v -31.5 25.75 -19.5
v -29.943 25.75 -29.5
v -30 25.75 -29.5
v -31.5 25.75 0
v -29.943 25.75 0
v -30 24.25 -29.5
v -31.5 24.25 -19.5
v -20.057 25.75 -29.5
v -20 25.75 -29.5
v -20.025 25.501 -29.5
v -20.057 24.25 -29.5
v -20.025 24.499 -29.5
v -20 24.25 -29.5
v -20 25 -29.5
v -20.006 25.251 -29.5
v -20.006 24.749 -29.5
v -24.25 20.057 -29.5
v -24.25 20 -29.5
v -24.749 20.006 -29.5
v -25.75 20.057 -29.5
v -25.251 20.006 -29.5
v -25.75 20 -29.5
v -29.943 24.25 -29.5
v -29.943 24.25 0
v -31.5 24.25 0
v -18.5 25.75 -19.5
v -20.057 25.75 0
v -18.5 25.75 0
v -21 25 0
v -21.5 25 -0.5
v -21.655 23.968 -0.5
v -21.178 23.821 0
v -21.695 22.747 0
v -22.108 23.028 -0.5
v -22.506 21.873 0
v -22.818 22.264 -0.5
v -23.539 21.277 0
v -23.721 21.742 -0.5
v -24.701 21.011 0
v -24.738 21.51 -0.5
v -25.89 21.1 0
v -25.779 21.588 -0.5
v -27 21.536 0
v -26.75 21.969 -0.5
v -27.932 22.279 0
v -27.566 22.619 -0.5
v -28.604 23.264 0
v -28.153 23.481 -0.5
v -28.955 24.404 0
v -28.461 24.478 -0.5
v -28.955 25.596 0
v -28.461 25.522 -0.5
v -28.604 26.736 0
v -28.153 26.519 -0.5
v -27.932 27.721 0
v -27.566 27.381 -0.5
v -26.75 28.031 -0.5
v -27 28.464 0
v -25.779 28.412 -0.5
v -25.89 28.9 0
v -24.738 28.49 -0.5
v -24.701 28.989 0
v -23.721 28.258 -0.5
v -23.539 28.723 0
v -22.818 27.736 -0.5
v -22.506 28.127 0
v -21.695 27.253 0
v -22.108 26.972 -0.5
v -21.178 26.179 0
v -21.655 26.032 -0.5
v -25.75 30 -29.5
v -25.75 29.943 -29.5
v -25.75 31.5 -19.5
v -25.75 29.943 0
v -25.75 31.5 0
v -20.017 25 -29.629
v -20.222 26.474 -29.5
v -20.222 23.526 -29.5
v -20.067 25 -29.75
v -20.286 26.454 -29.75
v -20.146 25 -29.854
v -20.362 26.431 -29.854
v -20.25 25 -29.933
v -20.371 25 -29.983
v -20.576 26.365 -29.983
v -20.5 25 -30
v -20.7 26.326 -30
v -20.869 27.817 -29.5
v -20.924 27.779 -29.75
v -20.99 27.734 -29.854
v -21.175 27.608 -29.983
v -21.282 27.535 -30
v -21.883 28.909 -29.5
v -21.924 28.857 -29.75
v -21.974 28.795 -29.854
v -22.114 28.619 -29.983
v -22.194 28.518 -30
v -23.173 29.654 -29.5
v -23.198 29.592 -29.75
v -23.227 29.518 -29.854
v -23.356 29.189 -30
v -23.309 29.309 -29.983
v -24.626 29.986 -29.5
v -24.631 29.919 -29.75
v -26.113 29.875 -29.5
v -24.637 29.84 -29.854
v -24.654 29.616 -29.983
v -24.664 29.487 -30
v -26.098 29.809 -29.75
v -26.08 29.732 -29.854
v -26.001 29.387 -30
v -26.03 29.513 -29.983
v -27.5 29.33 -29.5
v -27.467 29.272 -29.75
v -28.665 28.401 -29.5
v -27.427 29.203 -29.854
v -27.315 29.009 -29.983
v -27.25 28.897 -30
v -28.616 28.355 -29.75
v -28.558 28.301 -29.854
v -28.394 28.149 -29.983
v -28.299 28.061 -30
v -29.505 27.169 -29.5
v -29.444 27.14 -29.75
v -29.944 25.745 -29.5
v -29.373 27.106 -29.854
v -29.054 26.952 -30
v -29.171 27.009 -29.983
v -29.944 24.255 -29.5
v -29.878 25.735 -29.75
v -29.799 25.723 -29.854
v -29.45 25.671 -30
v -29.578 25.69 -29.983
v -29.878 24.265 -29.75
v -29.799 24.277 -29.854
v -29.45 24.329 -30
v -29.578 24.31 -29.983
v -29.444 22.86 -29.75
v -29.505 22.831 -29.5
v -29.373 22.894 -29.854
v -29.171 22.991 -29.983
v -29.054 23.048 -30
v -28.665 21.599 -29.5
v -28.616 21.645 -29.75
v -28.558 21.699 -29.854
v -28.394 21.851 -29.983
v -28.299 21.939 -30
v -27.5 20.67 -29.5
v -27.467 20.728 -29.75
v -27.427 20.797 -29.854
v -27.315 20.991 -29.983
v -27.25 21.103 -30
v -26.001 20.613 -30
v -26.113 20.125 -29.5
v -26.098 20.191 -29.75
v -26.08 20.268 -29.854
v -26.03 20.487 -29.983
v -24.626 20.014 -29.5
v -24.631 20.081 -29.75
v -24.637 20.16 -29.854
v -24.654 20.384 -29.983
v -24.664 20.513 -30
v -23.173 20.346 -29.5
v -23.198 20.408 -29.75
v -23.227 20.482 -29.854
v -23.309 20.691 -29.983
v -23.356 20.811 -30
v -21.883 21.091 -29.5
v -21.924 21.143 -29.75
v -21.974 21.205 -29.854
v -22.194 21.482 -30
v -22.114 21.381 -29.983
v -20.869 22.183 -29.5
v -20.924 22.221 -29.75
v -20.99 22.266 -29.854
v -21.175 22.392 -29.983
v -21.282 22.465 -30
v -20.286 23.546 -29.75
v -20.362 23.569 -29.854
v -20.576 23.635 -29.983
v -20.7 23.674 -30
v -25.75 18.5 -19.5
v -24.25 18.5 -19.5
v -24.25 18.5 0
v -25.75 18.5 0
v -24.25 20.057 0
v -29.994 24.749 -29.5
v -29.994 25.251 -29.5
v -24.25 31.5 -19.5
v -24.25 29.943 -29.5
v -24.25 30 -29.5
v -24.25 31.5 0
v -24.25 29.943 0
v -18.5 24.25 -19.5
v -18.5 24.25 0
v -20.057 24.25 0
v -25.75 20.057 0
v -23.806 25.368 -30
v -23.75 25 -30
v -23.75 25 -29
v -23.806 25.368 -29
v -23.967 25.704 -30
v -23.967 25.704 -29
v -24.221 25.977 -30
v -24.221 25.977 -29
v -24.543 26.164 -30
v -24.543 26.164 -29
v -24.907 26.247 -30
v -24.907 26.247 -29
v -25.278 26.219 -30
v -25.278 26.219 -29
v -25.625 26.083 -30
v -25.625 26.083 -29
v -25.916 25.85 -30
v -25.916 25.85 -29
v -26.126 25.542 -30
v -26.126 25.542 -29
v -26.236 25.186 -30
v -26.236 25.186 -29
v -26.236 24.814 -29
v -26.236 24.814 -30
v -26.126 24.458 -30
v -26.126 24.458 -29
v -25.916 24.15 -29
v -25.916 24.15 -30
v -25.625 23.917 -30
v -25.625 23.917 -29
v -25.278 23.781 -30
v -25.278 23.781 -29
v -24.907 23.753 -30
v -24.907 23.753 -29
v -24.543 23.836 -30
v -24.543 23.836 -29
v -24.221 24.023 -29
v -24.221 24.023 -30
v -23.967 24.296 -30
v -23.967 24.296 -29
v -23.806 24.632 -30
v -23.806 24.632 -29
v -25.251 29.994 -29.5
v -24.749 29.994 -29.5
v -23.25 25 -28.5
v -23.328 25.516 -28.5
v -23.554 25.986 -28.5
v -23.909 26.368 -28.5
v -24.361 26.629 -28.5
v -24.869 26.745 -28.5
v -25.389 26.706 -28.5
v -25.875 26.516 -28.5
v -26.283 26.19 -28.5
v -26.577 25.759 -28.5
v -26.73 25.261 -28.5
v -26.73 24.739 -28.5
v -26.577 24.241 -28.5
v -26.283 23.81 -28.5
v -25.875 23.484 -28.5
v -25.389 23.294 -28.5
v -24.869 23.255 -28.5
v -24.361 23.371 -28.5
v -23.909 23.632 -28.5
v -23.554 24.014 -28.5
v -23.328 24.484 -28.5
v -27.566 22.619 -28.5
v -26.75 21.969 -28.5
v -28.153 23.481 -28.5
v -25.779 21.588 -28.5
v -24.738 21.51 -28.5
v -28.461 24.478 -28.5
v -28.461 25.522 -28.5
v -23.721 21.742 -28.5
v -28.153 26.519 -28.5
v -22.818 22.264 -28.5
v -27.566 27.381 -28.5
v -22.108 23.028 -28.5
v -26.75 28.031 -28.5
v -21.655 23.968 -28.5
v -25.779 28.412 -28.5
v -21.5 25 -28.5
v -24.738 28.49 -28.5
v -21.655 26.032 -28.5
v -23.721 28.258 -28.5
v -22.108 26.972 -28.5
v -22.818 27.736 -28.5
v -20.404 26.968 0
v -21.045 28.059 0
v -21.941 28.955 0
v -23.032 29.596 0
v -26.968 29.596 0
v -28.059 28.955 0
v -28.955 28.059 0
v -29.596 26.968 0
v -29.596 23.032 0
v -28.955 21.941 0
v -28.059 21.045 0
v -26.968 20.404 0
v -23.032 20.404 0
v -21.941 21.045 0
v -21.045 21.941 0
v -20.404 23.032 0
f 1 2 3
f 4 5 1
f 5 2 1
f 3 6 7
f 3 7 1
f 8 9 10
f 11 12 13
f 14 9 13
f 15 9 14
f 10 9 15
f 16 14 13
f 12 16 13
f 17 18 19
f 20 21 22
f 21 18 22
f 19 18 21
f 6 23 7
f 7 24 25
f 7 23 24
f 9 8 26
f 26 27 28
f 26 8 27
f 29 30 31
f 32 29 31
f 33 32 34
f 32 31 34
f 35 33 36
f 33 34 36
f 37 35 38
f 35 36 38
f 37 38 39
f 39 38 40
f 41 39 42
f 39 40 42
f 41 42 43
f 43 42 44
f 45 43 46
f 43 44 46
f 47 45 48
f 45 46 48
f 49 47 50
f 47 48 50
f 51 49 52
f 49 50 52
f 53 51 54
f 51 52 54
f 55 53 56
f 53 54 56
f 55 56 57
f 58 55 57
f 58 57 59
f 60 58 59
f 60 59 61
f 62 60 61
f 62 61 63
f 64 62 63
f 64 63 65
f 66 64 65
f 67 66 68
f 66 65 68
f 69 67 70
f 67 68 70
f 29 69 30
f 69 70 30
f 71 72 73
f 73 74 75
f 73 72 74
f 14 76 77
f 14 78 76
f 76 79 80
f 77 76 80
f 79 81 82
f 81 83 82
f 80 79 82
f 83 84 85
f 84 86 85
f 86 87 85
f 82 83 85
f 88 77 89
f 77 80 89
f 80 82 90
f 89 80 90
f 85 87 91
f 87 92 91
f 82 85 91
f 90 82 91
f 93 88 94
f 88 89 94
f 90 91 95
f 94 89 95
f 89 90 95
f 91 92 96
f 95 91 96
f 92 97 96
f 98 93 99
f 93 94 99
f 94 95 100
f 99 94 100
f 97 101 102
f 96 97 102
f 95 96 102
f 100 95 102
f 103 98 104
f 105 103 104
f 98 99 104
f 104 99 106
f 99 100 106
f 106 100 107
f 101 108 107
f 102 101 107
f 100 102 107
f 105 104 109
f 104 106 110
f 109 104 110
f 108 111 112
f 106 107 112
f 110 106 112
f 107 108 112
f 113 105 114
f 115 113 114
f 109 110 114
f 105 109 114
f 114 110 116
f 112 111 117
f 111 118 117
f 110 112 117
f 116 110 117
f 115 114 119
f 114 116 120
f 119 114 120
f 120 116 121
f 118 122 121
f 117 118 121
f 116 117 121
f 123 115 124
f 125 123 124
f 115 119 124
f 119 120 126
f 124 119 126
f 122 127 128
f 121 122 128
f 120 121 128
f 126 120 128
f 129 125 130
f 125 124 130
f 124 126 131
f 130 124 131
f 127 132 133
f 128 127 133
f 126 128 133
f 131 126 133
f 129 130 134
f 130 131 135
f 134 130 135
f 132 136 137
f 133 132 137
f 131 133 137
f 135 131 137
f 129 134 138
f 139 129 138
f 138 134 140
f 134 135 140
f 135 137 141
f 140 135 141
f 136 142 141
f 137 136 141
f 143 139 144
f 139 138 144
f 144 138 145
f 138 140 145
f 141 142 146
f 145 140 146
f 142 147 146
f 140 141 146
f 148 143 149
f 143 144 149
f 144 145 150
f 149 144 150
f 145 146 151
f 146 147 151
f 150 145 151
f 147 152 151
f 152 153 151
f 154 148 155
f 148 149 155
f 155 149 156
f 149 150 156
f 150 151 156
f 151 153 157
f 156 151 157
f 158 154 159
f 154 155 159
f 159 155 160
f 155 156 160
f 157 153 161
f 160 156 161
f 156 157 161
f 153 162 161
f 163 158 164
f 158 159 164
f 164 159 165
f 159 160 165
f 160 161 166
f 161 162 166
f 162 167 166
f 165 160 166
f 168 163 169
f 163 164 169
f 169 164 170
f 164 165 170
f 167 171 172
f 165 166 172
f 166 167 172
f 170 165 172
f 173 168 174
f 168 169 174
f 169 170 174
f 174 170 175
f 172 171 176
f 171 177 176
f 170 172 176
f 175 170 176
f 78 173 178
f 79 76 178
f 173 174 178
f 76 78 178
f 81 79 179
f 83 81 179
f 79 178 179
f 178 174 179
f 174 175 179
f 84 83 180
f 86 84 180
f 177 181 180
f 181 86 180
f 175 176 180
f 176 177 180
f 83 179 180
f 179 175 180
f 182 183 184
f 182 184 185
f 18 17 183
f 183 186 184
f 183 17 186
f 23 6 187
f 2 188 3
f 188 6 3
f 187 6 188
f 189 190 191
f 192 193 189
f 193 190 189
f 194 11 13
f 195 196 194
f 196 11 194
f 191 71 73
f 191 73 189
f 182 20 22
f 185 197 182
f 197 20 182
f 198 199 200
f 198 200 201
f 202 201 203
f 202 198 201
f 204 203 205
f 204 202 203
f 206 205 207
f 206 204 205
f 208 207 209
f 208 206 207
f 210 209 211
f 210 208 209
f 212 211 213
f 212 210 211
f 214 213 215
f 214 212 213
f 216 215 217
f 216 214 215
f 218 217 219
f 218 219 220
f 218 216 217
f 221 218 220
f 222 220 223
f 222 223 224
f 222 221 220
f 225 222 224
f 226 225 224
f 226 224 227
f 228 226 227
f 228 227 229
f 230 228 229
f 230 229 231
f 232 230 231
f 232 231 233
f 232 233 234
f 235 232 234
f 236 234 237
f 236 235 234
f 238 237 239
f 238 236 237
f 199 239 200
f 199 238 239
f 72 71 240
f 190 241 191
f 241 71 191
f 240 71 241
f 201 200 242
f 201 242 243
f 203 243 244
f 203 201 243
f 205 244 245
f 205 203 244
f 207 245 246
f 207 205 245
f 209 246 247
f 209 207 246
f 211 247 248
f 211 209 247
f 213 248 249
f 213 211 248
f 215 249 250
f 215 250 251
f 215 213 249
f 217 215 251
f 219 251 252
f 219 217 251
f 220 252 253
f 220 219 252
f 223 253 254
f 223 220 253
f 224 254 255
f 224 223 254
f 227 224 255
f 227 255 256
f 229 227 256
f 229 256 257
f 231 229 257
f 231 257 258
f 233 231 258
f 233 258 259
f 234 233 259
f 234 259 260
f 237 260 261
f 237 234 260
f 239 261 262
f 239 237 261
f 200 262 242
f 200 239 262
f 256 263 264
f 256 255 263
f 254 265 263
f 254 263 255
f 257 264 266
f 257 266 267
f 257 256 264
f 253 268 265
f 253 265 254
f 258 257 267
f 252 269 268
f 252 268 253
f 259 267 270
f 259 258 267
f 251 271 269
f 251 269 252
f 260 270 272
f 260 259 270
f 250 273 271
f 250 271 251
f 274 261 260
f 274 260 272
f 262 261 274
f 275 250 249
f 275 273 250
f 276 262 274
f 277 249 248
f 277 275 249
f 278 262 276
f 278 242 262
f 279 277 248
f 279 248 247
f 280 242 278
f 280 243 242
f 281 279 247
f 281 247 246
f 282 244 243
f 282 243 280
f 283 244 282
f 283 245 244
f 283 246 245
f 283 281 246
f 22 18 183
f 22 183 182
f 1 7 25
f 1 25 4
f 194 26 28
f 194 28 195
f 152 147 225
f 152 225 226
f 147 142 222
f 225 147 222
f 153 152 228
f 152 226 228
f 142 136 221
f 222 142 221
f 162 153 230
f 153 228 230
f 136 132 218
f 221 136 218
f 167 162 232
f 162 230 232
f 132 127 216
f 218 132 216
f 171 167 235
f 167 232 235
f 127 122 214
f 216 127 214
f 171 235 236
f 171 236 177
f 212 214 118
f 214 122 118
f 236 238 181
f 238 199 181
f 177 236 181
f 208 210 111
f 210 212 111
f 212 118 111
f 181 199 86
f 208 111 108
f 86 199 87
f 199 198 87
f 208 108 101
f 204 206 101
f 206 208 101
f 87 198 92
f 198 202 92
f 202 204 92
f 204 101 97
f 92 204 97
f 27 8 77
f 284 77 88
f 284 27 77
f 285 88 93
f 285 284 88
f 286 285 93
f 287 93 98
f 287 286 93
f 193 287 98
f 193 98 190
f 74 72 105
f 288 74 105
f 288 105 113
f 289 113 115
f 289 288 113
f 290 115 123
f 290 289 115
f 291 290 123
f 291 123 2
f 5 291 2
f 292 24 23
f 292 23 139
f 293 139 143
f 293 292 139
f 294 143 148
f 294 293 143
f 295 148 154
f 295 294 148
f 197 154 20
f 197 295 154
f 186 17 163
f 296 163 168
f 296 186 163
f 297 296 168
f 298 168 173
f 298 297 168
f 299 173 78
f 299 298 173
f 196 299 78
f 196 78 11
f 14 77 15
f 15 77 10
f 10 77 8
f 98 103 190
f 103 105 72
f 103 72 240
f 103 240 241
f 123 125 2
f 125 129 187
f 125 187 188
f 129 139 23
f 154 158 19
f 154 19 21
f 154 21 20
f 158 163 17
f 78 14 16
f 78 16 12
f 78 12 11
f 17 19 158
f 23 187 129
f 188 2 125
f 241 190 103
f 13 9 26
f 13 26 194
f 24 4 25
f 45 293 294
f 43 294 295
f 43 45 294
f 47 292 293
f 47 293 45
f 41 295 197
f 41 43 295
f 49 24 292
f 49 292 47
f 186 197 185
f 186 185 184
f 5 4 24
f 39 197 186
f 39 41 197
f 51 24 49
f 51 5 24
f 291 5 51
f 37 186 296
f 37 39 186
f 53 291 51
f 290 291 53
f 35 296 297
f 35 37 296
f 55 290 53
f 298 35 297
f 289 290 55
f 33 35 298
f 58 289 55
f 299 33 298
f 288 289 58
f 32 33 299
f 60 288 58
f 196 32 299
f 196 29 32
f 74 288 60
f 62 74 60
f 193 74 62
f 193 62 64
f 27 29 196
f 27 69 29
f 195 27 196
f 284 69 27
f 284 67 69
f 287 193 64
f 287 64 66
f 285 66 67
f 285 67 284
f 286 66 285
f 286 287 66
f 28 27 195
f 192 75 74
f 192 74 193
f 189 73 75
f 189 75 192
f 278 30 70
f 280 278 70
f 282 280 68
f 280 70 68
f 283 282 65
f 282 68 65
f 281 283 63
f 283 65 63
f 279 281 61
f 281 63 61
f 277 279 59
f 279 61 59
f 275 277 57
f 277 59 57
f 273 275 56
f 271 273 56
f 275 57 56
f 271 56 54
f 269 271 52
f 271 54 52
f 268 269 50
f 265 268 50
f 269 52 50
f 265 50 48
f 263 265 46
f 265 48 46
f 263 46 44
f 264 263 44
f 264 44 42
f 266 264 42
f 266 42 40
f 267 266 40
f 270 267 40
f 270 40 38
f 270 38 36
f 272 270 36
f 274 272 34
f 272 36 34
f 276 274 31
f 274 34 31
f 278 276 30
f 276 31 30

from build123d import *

# Parameters (mm, degrees)
F1_R        = 5
F1_R_2      = 3.5
F2_DEPTH    = 30
F4_W        = 1.5
F4_H        = 2.639524132
F5_DEPTH    = 29.5
F6_COUNT    = 4
F8_R        = 3.5
F8_R_2      = 1.25
F9_DEPTH    = 1.5
F10_SIZE2   = 1.49999
F10_SIZE    = 9.99999
F10_2_SIZE2 = 1.49999
F10_2_SIZE  = 9.99999
F10_3_SIZE2 = 1.49999
F10_3_SIZE  = 9.99999
F10_4_SIZE2 = 1.49999
F10_4_SIZE  = 9.99999
F11_SIZE    = 0.5
F12_R       = 0.49999


# Not quite as in the source:
# - a fillet or chamfer is up to 0.001 mm smaller than in the source, because OpenCascade refuses the exact size


with BuildPart() as f2:
    # F1 (on offset) → F2 (new body)
    with BuildSketch(Plane.XY):
        with Locations((-25, 25)):
            Circle(F1_R)
        with Locations((-25, 25)):
            Circle(F1_R_2, mode=Mode.SUBTRACT)
    extrude(amount=-F2_DEPTH)

    # F4 (on offset) → F5 (join)
    with BuildSketch(Plane.XY):
        with Locations((-25, 30.180237934)):
            Rectangle(F4_W, F4_H)
    extrude(amount=-F5_DEPTH)

    # F6: F2 ×4 about axis
    f6_axis = Axis((-25, 25, 0), (0, 0, 1))


with BuildPart() as f2_1:
    add(f2.part)
    for i in range(1, F6_COUNT):
        add(f2.part.rotate(f6_axis, i * 360 / F6_COUNT))

    # F8 (on offset) → F9 (join)
    with BuildSketch(Plane.XY.offset(-30)):
        with Locations((-25, 25)):
            Circle(F8_R)
        with Locations((-25, 25)):
            Circle(F8_R_2, mode=Mode.SUBTRACT)
    extrude(amount=F9_DEPTH)

    # F10 (size 10 and 1.5 in the source; OpenCascade refuses exactly that, so slightly less here)
    f10_edges = [f2_1.edges().sort_by_distance(p)[0] for p in [
        (-25, 18.5, -29.5),
    ]]
    f10_side = f2_1.faces().sort_by_distance((-25, 18.5, -14.75))[0]
    chamfer(f10_edges, length=F10_SIZE, length2=F10_SIZE2, reference=f10_side)

    # F10#2 (size 10 and 1.5 in the source; OpenCascade refuses exactly that, so slightly less here)
    f10_2_edges = [f2_1.edges().sort_by_distance(p)[0] for p in [
        (-18.5, 25, -29.5),
    ]]
    f10_2_side = f2_1.faces().sort_by_distance((-18.5, 25, -14.75))[0]
    chamfer(f10_2_edges, length=F10_2_SIZE, length2=F10_2_SIZE2, reference=f10_2_side)

    # F10#3 (size 10 and 1.5 in the source; OpenCascade refuses exactly that, so slightly less here)
    f10_3_edges = [f2_1.edges().sort_by_distance(p)[0] for p in [
        (-25, 31.5, -29.5),
    ]]
    f10_3_side = f2_1.faces().sort_by_distance((-25, 31.5, -14.75))[0]
    chamfer(f10_3_edges, length=F10_3_SIZE, length2=F10_3_SIZE2, reference=f10_3_side)

    # F10#4 (size 10 and 1.5 in the source; OpenCascade refuses exactly that, so slightly less here)
    f10_4_edges = [f2_1.edges().sort_by_distance(p)[0] for p in [
        (-31.5, 25, -29.5),
    ]]
    f10_4_side = f2_1.faces().sort_by_distance((-31.5, 25, -14.75))[0]
    chamfer(f10_4_edges, length=F10_4_SIZE, length2=F10_4_SIZE2, reference=f10_4_side)

    # F11
    f11_edges = [f2_1.edges().sort_by_distance(p)[0] for p in [
        (-28.5, 25, 0),
        (-26.25, 25, -28.5),
    ]]
    chamfer(f11_edges, length=F11_SIZE)

    # F12 (radius 0.5 in the source; OpenCascade refuses exactly that, so slightly less here)
    f12_edges = [f2_1.edges().sort_by_distance(p)[0] for p in [
        (-30, 25, -30),
    ]]
    fillet(f12_edges, radius=F12_R)


solid = f2_1.part
